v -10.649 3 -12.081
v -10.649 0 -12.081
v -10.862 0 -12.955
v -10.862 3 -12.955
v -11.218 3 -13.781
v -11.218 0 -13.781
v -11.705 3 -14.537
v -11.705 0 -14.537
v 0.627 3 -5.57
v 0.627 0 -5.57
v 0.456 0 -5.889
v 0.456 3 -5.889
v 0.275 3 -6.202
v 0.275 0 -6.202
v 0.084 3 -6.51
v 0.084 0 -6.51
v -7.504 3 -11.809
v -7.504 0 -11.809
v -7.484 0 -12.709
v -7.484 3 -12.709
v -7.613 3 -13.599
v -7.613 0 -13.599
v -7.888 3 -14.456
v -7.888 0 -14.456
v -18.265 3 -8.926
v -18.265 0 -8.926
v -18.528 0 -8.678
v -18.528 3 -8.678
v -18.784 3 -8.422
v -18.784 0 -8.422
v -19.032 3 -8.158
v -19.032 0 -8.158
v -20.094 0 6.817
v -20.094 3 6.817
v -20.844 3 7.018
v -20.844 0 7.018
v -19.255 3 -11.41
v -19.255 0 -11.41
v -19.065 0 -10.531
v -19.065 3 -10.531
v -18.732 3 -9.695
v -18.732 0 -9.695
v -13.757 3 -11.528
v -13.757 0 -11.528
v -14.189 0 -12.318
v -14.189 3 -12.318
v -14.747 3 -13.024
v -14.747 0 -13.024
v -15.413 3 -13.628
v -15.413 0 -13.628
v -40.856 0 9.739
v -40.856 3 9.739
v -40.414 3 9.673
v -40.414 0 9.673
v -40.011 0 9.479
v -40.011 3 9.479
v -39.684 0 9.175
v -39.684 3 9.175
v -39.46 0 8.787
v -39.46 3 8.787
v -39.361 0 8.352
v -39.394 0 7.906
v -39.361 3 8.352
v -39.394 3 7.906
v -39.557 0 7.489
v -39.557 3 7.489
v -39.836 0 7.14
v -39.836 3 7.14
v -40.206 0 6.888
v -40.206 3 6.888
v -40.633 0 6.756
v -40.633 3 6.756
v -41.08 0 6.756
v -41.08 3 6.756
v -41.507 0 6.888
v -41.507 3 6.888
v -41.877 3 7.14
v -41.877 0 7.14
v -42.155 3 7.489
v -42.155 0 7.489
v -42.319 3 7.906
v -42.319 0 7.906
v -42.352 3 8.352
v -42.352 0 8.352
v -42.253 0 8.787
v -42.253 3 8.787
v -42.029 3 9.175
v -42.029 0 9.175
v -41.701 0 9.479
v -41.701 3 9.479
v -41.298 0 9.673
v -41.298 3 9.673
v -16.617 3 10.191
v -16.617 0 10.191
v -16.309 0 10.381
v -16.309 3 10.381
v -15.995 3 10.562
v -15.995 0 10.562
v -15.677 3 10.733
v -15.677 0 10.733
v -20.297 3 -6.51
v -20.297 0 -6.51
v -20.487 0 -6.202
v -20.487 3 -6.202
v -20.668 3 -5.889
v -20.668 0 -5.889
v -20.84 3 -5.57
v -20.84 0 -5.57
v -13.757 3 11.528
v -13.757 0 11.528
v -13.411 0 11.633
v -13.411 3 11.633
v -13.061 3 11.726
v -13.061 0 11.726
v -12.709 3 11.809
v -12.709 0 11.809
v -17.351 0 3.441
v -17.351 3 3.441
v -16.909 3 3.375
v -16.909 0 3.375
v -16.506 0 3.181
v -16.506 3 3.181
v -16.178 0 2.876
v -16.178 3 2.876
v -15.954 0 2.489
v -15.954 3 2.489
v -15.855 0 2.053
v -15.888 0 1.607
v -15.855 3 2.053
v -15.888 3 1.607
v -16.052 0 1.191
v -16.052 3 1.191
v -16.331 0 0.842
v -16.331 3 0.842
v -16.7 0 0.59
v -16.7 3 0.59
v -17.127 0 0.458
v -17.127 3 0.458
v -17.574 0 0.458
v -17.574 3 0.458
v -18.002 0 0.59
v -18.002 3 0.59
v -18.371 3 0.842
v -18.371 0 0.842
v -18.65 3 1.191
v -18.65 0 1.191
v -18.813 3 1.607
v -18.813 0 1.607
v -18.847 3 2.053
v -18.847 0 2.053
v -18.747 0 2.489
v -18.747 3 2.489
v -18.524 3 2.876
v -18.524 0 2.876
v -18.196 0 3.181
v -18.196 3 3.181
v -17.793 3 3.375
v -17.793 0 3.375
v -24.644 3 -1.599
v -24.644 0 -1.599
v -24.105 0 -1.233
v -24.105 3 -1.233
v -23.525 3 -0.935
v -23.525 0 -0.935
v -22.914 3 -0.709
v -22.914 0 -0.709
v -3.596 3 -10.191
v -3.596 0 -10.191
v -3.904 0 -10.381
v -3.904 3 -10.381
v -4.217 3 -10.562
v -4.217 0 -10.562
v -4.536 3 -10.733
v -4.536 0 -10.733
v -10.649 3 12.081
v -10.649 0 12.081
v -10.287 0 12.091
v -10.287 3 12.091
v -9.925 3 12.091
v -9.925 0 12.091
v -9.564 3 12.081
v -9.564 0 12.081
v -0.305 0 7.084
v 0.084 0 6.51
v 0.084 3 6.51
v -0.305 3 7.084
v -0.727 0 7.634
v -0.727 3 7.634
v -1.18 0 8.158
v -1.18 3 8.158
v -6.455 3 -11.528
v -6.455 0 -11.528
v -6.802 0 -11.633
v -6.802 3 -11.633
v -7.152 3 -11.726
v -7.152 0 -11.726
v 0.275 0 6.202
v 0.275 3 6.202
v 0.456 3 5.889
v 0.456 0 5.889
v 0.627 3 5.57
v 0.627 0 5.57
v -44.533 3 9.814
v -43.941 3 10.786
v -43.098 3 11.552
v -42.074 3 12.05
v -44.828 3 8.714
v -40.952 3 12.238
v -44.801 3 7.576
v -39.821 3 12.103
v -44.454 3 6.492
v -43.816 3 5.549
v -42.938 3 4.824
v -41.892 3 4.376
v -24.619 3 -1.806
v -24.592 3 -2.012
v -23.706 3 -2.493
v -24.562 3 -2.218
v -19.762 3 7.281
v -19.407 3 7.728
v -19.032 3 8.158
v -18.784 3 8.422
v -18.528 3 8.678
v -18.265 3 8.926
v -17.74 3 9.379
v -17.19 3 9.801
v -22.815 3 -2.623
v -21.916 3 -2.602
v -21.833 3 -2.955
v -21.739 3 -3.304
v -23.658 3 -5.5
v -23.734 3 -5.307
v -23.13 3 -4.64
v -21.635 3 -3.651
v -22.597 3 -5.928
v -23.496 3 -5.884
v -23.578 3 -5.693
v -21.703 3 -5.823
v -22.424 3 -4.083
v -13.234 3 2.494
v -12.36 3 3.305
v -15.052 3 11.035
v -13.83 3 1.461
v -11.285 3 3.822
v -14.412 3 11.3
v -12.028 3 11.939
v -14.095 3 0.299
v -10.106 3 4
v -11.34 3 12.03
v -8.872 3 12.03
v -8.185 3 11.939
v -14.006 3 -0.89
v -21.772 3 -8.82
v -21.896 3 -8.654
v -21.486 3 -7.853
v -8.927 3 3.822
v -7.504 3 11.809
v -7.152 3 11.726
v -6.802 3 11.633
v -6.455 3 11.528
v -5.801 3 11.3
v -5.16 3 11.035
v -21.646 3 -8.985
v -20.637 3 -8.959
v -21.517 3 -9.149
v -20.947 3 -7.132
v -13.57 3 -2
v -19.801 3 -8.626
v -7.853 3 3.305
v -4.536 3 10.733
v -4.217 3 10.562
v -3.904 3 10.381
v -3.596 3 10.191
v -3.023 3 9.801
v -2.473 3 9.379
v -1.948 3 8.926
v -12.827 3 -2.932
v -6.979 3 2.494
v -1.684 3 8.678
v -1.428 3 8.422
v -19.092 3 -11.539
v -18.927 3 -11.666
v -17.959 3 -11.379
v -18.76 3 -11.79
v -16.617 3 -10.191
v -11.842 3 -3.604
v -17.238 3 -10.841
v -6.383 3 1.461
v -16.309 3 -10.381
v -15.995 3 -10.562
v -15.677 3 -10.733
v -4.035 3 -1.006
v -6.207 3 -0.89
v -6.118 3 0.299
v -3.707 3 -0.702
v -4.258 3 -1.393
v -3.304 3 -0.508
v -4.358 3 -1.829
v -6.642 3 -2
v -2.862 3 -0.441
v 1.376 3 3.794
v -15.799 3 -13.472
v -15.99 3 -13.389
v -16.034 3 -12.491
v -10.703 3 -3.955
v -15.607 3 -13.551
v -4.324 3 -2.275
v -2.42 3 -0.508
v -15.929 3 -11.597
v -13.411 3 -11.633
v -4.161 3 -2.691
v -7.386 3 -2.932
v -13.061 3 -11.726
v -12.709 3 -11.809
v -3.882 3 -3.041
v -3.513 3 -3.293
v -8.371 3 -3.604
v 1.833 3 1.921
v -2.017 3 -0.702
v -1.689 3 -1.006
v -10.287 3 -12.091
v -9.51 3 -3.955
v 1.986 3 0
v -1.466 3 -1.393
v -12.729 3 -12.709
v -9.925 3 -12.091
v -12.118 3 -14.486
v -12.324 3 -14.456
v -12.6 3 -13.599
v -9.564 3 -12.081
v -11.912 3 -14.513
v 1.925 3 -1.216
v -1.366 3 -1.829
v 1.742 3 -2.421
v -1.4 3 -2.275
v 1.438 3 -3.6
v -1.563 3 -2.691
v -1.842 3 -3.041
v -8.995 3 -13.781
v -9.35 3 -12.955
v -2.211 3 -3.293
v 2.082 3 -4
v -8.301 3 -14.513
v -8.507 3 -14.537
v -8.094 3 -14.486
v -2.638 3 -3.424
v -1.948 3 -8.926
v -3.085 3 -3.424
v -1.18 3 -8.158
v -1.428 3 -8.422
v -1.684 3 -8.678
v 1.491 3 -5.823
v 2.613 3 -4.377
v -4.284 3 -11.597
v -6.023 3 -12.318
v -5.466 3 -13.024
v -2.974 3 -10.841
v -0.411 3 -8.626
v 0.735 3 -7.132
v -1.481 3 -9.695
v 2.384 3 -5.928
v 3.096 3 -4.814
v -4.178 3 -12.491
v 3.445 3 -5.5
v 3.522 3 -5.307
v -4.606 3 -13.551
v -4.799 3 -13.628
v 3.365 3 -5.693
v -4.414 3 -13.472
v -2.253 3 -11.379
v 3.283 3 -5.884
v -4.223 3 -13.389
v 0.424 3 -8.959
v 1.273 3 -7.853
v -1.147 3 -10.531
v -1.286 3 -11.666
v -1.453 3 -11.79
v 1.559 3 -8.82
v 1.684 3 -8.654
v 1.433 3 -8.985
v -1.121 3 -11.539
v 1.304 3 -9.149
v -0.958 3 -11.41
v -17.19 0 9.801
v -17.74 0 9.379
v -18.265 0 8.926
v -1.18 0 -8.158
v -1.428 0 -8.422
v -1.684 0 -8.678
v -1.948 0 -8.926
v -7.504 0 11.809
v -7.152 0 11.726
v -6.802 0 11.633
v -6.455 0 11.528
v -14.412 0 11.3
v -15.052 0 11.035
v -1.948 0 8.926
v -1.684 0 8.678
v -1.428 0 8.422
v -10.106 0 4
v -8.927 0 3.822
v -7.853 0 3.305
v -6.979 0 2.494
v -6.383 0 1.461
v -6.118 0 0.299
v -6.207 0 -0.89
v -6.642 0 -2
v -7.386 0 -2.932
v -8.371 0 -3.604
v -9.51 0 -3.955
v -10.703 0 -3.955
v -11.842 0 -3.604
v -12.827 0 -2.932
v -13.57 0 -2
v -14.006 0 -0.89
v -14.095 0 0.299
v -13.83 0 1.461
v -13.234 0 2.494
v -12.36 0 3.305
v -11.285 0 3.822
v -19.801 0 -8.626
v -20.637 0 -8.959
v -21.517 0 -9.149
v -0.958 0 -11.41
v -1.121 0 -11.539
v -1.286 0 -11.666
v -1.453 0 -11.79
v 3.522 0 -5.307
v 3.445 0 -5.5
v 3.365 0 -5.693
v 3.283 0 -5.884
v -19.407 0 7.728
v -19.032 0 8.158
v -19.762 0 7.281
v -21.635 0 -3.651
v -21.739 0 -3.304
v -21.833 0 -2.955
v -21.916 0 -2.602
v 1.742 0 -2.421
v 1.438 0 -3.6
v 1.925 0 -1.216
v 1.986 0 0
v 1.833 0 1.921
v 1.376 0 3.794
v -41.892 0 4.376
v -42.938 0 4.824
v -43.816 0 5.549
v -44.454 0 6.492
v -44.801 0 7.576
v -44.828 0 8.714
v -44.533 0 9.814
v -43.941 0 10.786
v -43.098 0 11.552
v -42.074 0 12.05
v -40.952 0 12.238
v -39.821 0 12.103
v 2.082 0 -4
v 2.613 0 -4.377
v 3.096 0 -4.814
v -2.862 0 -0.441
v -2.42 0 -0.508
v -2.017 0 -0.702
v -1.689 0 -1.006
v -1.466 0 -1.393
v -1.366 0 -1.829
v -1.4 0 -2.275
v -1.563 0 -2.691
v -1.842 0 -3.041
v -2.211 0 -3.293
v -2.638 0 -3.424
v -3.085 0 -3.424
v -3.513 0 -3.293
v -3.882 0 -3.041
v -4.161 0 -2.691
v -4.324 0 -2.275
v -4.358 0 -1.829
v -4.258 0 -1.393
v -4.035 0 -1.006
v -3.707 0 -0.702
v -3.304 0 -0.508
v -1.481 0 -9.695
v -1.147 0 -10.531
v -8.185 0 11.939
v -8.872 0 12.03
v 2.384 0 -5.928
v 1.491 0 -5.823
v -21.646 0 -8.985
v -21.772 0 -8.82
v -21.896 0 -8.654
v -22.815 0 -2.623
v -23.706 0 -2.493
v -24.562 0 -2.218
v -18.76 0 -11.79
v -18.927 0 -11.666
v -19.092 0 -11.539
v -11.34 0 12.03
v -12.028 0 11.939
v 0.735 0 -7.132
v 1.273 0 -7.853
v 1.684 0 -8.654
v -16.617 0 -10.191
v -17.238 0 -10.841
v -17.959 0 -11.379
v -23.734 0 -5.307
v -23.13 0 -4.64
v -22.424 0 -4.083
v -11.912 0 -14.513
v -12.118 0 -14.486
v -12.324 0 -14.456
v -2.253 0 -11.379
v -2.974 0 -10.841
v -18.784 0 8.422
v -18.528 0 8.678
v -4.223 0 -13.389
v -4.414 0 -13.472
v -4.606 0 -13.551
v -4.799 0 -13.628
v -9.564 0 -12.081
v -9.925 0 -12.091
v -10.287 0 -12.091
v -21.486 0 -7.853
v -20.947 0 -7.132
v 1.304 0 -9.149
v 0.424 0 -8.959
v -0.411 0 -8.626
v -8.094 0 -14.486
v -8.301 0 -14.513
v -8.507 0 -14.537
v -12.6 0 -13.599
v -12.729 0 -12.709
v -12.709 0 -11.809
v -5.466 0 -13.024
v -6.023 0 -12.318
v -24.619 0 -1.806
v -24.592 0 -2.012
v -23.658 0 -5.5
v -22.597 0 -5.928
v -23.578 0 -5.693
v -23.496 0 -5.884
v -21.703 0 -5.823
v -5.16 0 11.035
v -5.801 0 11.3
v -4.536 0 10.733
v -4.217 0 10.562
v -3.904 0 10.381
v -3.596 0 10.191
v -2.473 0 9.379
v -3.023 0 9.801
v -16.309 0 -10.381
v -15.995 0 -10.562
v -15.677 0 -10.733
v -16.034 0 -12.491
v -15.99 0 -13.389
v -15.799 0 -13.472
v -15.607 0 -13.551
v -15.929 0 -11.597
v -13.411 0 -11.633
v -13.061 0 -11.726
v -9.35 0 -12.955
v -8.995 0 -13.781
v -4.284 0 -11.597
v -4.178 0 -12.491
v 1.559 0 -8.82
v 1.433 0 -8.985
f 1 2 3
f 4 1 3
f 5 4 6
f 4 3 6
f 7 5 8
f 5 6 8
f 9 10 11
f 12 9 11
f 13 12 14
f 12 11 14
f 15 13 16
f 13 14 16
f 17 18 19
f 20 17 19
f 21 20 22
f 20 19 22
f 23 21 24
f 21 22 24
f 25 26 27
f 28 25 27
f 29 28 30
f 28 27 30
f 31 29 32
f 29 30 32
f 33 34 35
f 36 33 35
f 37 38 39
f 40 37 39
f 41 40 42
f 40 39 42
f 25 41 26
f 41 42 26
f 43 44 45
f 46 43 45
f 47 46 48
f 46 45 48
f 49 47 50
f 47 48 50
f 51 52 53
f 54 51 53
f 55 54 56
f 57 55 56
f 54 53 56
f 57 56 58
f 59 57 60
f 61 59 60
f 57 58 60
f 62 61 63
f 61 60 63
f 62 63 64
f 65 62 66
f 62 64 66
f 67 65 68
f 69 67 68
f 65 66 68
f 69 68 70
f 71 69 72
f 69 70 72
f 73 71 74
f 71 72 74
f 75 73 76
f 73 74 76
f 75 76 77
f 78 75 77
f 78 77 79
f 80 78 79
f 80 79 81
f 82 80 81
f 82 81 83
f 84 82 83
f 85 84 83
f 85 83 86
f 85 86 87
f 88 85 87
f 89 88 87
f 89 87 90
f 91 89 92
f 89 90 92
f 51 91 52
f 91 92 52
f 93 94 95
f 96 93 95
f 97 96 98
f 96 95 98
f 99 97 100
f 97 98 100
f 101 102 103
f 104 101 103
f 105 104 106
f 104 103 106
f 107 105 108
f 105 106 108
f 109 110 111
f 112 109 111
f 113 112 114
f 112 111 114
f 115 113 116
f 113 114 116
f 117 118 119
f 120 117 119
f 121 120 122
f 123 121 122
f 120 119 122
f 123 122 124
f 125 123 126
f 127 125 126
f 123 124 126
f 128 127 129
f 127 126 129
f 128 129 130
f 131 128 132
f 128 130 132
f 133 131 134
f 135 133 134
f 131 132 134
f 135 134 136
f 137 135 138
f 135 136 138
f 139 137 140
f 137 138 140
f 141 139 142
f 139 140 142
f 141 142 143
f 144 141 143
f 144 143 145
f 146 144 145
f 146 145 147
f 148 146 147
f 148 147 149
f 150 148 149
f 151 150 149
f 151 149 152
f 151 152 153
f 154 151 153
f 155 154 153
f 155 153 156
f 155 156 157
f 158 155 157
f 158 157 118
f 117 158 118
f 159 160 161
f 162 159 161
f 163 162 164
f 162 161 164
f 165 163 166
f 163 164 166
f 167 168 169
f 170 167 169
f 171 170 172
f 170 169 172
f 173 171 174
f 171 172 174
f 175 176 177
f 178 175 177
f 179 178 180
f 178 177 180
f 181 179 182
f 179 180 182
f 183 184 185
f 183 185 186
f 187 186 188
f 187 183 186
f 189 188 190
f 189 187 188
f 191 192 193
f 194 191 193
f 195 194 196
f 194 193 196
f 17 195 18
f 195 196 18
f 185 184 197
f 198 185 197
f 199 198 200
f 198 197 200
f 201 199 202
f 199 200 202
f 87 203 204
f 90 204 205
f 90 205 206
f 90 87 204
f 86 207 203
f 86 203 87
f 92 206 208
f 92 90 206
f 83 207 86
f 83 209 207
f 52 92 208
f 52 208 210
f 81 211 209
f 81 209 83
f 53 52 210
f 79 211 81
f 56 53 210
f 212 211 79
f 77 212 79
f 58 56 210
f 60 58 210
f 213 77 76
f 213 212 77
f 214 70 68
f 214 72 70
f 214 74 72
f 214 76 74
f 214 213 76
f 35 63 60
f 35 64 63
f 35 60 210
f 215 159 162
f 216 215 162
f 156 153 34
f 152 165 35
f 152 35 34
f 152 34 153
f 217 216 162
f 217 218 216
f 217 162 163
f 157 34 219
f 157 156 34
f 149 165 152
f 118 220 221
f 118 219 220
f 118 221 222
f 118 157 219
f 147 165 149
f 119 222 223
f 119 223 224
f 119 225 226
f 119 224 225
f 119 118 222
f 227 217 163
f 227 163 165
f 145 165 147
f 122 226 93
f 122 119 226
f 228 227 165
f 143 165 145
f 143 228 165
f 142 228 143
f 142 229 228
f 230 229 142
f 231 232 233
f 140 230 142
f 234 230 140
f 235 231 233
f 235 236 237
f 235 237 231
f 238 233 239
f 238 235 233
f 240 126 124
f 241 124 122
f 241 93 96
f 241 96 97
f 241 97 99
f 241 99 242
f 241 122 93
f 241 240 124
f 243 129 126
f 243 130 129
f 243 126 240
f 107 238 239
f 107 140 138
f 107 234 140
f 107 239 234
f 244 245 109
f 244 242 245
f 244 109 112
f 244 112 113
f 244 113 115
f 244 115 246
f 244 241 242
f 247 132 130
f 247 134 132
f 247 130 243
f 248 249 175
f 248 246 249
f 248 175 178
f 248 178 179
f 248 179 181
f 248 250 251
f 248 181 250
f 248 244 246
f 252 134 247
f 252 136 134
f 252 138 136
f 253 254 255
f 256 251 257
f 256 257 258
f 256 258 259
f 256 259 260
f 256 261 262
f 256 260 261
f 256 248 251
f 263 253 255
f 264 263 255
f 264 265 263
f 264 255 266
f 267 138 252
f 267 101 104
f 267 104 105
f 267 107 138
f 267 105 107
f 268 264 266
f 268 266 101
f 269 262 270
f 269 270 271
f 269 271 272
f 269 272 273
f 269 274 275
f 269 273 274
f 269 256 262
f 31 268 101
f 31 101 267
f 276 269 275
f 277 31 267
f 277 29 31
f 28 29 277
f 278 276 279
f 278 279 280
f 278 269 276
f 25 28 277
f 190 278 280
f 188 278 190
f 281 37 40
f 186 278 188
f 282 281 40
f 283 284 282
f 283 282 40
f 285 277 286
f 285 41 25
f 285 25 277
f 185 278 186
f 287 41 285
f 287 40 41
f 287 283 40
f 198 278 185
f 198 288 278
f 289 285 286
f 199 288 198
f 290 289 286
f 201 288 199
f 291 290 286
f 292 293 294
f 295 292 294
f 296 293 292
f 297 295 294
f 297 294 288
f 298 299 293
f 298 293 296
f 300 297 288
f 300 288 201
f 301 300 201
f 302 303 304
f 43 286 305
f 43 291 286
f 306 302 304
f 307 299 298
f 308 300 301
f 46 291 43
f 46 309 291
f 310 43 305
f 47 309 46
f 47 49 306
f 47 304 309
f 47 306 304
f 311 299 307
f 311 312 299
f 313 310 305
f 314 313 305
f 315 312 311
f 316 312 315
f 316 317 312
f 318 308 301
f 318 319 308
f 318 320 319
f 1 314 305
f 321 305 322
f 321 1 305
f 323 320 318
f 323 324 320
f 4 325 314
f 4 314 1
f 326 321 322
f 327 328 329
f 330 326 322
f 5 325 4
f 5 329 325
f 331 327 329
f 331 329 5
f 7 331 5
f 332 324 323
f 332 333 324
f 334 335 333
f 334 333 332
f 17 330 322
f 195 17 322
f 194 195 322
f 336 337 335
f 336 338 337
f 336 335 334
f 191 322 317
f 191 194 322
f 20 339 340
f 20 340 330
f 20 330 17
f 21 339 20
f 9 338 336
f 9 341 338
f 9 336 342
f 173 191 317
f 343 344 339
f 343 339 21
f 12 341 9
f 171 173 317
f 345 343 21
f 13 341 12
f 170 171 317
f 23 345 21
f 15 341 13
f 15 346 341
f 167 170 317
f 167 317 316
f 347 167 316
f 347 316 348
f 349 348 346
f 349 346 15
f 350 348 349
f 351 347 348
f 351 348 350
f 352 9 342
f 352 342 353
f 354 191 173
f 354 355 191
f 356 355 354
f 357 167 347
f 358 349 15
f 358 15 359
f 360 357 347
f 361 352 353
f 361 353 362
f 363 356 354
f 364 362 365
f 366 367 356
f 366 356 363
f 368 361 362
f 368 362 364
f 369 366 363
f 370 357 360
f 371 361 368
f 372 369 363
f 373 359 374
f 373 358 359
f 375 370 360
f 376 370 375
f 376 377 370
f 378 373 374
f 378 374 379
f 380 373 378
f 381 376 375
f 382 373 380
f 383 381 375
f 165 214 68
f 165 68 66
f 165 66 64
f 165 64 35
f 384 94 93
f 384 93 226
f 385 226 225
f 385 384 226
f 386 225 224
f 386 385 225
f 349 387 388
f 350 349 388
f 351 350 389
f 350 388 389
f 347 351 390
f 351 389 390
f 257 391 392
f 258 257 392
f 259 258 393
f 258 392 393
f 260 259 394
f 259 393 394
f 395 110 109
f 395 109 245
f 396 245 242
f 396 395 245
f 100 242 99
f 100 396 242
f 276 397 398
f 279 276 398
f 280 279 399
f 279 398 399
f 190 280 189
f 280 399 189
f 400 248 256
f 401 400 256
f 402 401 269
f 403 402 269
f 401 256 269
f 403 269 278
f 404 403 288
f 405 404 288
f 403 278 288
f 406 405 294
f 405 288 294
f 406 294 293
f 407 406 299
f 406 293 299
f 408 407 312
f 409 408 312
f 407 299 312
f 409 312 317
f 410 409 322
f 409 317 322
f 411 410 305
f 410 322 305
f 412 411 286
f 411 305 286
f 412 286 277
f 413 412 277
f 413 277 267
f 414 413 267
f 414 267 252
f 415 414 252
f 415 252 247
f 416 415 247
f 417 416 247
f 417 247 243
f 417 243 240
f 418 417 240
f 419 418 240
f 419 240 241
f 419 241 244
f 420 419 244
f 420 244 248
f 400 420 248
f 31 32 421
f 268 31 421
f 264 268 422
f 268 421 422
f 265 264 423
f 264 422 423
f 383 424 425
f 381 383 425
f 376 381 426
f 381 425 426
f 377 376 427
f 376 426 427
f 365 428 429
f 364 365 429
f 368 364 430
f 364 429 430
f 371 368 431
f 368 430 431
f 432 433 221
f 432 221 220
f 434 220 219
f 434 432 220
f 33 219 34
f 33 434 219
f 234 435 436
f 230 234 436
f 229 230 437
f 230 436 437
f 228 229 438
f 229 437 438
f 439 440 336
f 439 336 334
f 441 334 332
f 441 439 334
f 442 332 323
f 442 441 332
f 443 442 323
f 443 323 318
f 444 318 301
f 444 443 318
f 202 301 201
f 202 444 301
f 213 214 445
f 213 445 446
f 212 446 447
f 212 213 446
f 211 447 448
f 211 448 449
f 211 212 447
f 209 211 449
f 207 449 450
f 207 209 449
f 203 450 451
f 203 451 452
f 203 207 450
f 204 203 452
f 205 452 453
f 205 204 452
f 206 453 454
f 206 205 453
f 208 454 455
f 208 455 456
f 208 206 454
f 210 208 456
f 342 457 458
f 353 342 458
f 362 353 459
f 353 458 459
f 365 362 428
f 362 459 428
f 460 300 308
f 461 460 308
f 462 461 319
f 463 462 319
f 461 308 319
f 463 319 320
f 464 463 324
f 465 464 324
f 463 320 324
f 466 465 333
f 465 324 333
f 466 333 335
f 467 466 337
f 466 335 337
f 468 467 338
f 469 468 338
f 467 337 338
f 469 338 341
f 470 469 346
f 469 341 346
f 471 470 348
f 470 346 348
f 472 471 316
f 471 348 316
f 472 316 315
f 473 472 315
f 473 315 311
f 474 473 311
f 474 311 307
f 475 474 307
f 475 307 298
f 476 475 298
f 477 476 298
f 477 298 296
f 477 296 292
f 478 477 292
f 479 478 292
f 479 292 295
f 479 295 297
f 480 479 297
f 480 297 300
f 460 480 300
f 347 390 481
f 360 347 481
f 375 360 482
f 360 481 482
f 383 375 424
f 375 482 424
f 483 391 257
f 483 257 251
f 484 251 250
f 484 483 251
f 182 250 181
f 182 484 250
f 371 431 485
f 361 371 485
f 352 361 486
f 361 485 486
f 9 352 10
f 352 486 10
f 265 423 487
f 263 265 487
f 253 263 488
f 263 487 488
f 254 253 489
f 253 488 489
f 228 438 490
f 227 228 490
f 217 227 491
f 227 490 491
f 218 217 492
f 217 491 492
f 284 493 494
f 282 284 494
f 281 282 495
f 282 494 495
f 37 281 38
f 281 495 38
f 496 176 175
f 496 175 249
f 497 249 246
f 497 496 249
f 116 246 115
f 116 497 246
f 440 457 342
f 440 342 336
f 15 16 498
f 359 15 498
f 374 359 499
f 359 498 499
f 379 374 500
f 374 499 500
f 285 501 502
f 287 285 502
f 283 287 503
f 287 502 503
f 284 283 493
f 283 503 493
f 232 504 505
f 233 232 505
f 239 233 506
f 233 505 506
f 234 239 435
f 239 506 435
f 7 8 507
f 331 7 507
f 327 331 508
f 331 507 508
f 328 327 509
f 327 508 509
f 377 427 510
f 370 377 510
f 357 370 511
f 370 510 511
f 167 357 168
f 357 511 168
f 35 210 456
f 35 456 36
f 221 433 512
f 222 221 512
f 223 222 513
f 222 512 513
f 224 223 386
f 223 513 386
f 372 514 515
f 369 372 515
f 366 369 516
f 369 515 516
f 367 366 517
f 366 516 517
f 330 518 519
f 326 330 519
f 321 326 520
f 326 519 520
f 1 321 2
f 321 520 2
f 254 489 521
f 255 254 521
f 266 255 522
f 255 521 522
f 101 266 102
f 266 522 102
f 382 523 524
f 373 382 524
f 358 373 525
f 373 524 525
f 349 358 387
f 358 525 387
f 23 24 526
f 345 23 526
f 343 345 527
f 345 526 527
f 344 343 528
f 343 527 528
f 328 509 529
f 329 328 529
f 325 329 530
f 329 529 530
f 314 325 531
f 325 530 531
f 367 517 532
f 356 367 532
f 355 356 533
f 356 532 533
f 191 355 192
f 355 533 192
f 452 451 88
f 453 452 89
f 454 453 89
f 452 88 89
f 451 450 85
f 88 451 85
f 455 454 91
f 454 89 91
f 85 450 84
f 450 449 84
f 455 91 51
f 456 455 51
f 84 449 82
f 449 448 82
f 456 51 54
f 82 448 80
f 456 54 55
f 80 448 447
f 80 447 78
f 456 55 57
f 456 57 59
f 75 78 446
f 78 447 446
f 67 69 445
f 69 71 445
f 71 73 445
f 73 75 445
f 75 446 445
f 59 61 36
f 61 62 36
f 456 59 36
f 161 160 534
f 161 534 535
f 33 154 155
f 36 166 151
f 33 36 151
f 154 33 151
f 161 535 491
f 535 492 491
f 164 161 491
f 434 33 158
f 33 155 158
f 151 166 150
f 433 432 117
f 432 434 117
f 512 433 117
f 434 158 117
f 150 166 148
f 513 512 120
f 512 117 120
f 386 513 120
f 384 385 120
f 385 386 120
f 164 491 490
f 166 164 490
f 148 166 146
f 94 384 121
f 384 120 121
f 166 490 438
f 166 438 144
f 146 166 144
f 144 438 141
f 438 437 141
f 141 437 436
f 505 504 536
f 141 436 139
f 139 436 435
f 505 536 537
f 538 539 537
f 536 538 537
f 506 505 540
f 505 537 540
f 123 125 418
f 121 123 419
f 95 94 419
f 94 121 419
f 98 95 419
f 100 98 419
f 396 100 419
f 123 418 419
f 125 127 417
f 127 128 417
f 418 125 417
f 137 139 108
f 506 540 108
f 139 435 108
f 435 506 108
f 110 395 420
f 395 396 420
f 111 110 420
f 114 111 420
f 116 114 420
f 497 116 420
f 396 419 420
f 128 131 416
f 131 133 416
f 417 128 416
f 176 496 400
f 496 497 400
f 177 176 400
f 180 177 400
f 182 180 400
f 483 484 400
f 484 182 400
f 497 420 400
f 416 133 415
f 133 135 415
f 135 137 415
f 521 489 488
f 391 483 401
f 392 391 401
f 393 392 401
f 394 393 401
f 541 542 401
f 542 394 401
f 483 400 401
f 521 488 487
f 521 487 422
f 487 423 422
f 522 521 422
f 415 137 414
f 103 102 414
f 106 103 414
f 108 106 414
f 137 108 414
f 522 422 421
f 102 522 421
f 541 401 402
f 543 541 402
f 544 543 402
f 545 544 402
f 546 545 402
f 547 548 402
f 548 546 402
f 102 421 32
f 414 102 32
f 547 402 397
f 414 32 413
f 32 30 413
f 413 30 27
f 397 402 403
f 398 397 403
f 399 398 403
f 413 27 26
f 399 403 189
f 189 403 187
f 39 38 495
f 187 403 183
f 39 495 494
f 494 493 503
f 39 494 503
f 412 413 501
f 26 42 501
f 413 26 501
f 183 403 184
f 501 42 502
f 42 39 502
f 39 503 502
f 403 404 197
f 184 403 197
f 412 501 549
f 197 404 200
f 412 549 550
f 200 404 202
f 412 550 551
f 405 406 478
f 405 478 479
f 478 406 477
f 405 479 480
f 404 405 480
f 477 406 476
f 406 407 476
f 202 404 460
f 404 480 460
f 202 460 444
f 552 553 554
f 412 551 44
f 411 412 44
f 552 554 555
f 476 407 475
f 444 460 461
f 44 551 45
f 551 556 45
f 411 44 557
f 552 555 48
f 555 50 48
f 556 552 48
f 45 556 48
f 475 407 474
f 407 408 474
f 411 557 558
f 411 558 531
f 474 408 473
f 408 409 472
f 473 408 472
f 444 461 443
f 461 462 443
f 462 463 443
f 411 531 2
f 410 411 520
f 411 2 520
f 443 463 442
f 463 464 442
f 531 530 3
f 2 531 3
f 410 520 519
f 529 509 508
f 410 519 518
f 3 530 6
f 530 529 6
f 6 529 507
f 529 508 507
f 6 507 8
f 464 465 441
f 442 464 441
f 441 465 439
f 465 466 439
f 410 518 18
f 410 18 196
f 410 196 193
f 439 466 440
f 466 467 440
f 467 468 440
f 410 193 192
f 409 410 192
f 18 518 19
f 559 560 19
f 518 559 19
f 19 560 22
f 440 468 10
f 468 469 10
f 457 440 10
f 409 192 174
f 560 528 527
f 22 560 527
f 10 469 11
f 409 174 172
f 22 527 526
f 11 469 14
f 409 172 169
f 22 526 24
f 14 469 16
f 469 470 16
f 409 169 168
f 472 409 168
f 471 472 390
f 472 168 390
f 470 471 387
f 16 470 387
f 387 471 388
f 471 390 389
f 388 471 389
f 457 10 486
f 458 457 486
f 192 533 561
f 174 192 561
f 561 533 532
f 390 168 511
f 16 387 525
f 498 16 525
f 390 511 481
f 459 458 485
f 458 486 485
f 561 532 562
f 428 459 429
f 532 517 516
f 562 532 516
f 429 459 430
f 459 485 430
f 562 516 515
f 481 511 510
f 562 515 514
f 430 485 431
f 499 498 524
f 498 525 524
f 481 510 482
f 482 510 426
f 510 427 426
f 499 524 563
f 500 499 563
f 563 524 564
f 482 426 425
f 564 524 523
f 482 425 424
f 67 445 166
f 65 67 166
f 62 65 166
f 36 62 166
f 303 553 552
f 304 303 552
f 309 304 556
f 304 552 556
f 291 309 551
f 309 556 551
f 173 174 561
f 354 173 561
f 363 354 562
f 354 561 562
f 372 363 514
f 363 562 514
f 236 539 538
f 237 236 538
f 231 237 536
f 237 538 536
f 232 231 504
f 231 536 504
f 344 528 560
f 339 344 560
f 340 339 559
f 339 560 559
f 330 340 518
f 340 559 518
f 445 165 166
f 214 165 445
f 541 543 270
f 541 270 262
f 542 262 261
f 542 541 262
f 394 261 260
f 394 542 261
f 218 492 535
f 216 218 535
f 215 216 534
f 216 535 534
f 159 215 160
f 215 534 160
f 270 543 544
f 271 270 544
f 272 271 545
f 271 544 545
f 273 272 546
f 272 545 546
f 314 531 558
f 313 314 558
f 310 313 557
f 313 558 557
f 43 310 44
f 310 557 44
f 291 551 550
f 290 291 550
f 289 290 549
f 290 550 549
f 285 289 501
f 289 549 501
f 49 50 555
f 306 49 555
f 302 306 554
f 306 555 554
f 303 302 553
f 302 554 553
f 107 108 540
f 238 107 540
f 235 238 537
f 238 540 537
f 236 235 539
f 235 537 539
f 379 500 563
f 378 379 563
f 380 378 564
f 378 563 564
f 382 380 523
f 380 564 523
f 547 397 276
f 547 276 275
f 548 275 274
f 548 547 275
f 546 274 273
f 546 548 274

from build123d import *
from build123d.topology import SkipClean

# Parameters (mm, degrees)
SKETCH1_R           = 1.5
BOSS_EXTRUDE1_DEPTH = 3
SKETCH3_R           = 1.5
BOSS_EXTRUDE2_DEPTH = 3
CUT_EXTRUDE1_START  = -3
CUT_EXTRUDE1_DEPTH  = 3
CUT_EXTRUDE2_REACH  = 49.249
SKETCH5_R           = 1.5
SKETCH5_R_2         = 4


with BuildPart() as part:
    # Sketch1 → Boss-Extrude1 (new body)
    with BuildSketch(Plane(origin=(0, 0, 0), x_dir=(1, 0, 0), z_dir=(0, 1, 0))):
        with BuildLine():
            Line((20.643657446, 4), (2.081641936, 4))
            ThreePointArc((2.081641936, 4), (2.861028333, 4.588201733), (3.521749436, 5.30713988))
            ThreePointArc((3.521749436, 5.30713988), (3.405395609, 5.596745198), (3.282888305, 5.883801663))
            ThreePointArc((3.282888305, 5.883801663), (1.93527598, 5.894040025), (0.627094961, 5.57027124))
            ThreePointArc((0.627094961, 5.57027124), (0.366286148, 6.046375), (0.084372603, 6.510293938))
            ThreePointArc((0.084372603, 6.510293938), (1.018855105, 7.48132754), (1.683794586, 8.65351323))
            ThreePointArc((1.683794586, 8.65351323), (1.496450048, 8.903135899), (1.303821399, 9.148703928))
            ThreePointArc((1.303821399, 9.148703928), (-0.000522033, 8.809805691), (-1.180330337, 8.158486898))
            ThreePointArc((-1.180330337, 8.158486898), (-1.555477026, 8.550865528), (-1.947855656, 8.926012217))
            ThreePointArc((-1.947855656, 8.926012217), (-1.296536862, 10.105820521), (-0.957638625, 11.410163953))
            ThreePointArc((-0.957638625, 11.410163953), (-1.203206655, 11.602792602), (-1.452829324, 11.79013714))
            ThreePointArc((-1.452829324, 11.79013714), (-2.625015014, 11.125197659), (-3.596048616, 10.190715157))
            ThreePointArc((-3.596048616, 10.190715157), (-4.059967554, 10.472628702), (-4.536071314, 10.733437515))
            ThreePointArc((-4.536071314, 10.733437515), (-4.212302529, 12.041618533), (-4.222540891, 13.389230859))
            ThreePointArc((-4.222540891, 13.389230859), (-4.509597355, 13.511738163), (-4.799202674, 13.62809199))
            ThreePointArc((-4.799202674, 13.62809199), (-5.759348103, 12.682425791), (-6.455432668, 11.528463019))
            ThreePointArc((-6.455432668, 11.528463019), (-6.976508546, 11.680699536), (-7.503891752, 11.809396783))
            ThreePointArc((-7.503891752, 11.809396783), (-7.529737283, 13.156800143), (-7.888414517, 14.455843809))
            ThreePointArc((-7.888414517, 14.455843809), (-8.197396993, 14.499881098), (-8.507248835, 14.537314892))
            ThreePointArc((-8.507248835, 14.537314892), (-9.18992168, 13.375367565), (-9.563620196, 12.080565177))
            ThreePointArc((-9.563620196, 12.080565177), (-10.106342554, 12.09275), (-10.649064912, 12.080565177))
            ThreePointArc((-10.649064912, 12.080565177), (-11.022763428, 13.375367565), (-11.705436272, 14.537314892))
            ThreePointArc((-11.705436272, 14.537314892), (-12.015288115, 14.499881098), (-12.324270591, 14.455843809))
            ThreePointArc((-12.324270591, 14.455843809), (-12.682947825, 13.156800143), (-12.708793355, 11.809396783))
            ThreePointArc((-12.708793355, 11.809396783), (-13.236176561, 11.680699536), (-13.757252439, 11.528463019))
            ThreePointArc((-13.757252439, 11.528463019), (-14.453337005, 12.682425791), (-15.413482434, 13.62809199))
            ThreePointArc((-15.413482434, 13.62809199), (-15.703087752, 13.511738163), (-15.990144217, 13.389230859))
            ThreePointArc((-15.990144217, 13.389230859), (-16.000382579, 12.041618533), (-15.676613793, 10.733437515))
            ThreePointArc((-15.676613793, 10.733437515), (-16.152717554, 10.472628702), (-16.616636492, 10.190715157))
            ThreePointArc((-16.616636492, 10.190715157), (-17.587670094, 11.125197659), (-18.759855783, 11.79013714))
            ThreePointArc((-18.759855783, 11.79013714), (-19.009478453, 11.602792602), (-19.255046482, 11.410163953))
            ThreePointArc((-19.255046482, 11.410163953), (-18.916148245, 10.105820521), (-18.264829452, 8.926012217))
            ThreePointArc((-18.264829452, 8.926012217), (-18.657208082, 8.550865528), (-19.032354771, 8.158486898))
            ThreePointArc((-19.032354771, 8.158486898), (-20.212163074, 8.809805691), (-21.516506507, 9.148703928))
            ThreePointArc((-21.516506507, 9.148703928), (-21.709135156, 8.903135899), (-21.896479694, 8.65351323))
            ThreePointArc((-21.896479694, 8.65351323), (-21.231540213, 7.48132754), (-20.297057711, 6.510293938))
            ThreePointArc((-20.297057711, 6.510293938), (-20.578971255, 6.046375), (-20.839780068, 5.57027124))
            ThreePointArc((-20.839780068, 5.57027124), (-22.147961087, 5.894040025), (-23.495573413, 5.883801663))
            ThreePointArc((-23.495573413, 5.883801663), (-23.618080717, 5.596745198), (-23.734434544, 5.30713988))
            ThreePointArc((-23.734434544, 5.30713988), (-22.788768345, 4.346994451), (-21.634805572, 3.650909885))
            ThreePointArc((-21.634805572, 3.650909885), (-21.78704209, 3.129834008), (-21.915739337, 2.602450802))
            ThreePointArc((-21.915739337, 2.602450802), (-23.263142697, 2.576605271), (-24.562186363, 2.217928037))
            ThreePointArc((-24.562186363, 2.217928037), (-24.606223651, 1.908945561), (-24.643657446, 1.599093719))
            ThreePointArc((-24.643657446, 1.599093719), (-23.481710119, 0.916420874), (-22.186907731, 0.542722358))
            ThreePointArc((-22.186907731, 0.542722358), (-22.199092554, 0), (-22.186907731, -0.542722358))
            ThreePointArc((-22.186907731, -0.542722358), (-23.481710119, -0.916420874), (-24.643657446, -1.599093719))
            ThreePointArc((-24.643657446, -1.599093719), (-24.606223651, -1.908945561), (-24.562186363, -2.217928037))
            ThreePointArc((-24.562186363, -2.217928037), (-23.263142697, -2.576605271), (-21.915739337, -2.602450802))
            ThreePointArc((-21.915739337, -2.602450802), (-21.78704209, -3.129834008), (-21.634805572, -3.650909885))
            ThreePointArc((-21.634805572, -3.650909885), (-22.788768345, -4.346994451), (-23.734434544, -5.30713988))
            ThreePointArc((-23.734434544, -5.30713988), (-23.618080717, -5.596745198), (-23.495573413, -5.883801663))
            ThreePointArc((-23.495573413, -5.883801663), (-22.147961087, -5.894040025), (-20.839780068, -5.57027124))
            ThreePointArc((-20.839780068, -5.57027124), (-20.578971255, -6.046375), (-20.297057711, -6.510293938))
            ThreePointArc((-20.297057711, -6.510293938), (-21.231540213, -7.48132754), (-21.896479694, -8.65351323))
            ThreePointArc((-21.896479694, -8.65351323), (-21.709135156, -8.903135899), (-21.516506507, -9.148703928))
            ThreePointArc((-21.516506507, -9.148703928), (-20.212163074, -8.809805691), (-19.032354771, -8.158486898))
            ThreePointArc((-19.032354771, -8.158486898), (-18.657208082, -8.550865528), (-18.264829452, -8.926012217))
            ThreePointArc((-18.264829452, -8.926012217), (-18.916148245, -10.105820521), (-19.255046482, -11.410163953))
            ThreePointArc((-19.255046482, -11.410163953), (-19.009478453, -11.602792602), (-18.759855783, -11.79013714))
            ThreePointArc((-18.759855783, -11.79013714), (-17.587670094, -11.125197659), (-16.616636492, -10.190715157))
            ThreePointArc((-16.616636492, -10.190715157), (-16.152717554, -10.472628702), (-15.676613793, -10.733437515))
            ThreePointArc((-15.676613793, -10.733437515), (-16.000382579, -12.041618533), (-15.990144217, -13.389230859))
            ThreePointArc((-15.990144217, -13.389230859), (-15.703087752, -13.511738163), (-15.413482434, -13.62809199))
            ThreePointArc((-15.413482434, -13.62809199), (-14.453337005, -12.682425791), (-13.757252439, -11.528463019))
            ThreePointArc((-13.757252439, -11.528463019), (-13.236176561, -11.680699536), (-12.708793355, -11.809396783))
            ThreePointArc((-12.708793355, -11.809396783), (-12.682947825, -13.156800143), (-12.324270591, -14.455843809))
            ThreePointArc((-12.324270591, -14.455843809), (-12.015288115, -14.499881098), (-11.705436272, -14.537314892))
            ThreePointArc((-11.705436272, -14.537314892), (-11.022763428, -13.375367565), (-10.649064912, -12.080565177))
            ThreePointArc((-10.649064912, -12.080565177), (-10.106342554, -12.09275), (-9.563620196, -12.080565177))
            ThreePointArc((-9.563620196, -12.080565177), (-9.18992168, -13.375367565), (-8.507248835, -14.537314892))
            ThreePointArc((-8.507248835, -14.537314892), (-8.197396993, -14.499881098), (-7.888414517, -14.455843809))
            ThreePointArc((-7.888414517, -14.455843809), (-7.529737283, -13.156800143), (-7.503891752, -11.809396783))
            ThreePointArc((-7.503891752, -11.809396783), (-6.976508546, -11.680699536), (-6.455432668, -11.528463019))
            ThreePointArc((-6.455432668, -11.528463019), (-5.759348103, -12.682425791), (-4.799202674, -13.62809199))
            ThreePointArc((-4.799202674, -13.62809199), (-4.509597355, -13.511738163), (-4.222540891, -13.389230859))
            ThreePointArc((-4.222540891, -13.389230859), (-4.212302529, -12.041618533), (-4.536071314, -10.733437515))
            ThreePointArc((-4.536071314, -10.733437515), (-4.059967554, -10.472628702), (-3.596048616, -10.190715157))
            ThreePointArc((-3.596048616, -10.190715157), (-2.625015014, -11.125197659), (-1.452829324, -11.79013714))
            ThreePointArc((-1.452829324, -11.79013714), (-1.203206655, -11.602792602), (-0.957638625, -11.410163953))
            ThreePointArc((-0.957638625, -11.410163953), (-1.296536862, -10.105820521), (-1.947855656, -8.926012217))
            ThreePointArc((-1.947855656, -8.926012217), (-1.555477026, -8.550865528), (-1.180330337, -8.158486898))
            ThreePointArc((-1.180330337, -8.158486898), (-0.000522033, -8.809805691), (1.303821399, -9.148703928))
            ThreePointArc((1.303821399, -9.148703928), (1.496450048, -8.903135899), (1.683794586, -8.65351323))
            ThreePointArc((1.683794586, -8.65351323), (1.018855105, -7.48132754), (0.084372603, -6.510293938))
            ThreePointArc((0.084372603, -6.510293938), (0.366286148, -6.046375), (0.627094961, -5.57027124))
            ThreePointArc((0.627094961, -5.57027124), (1.93527598, -5.894040025), (3.282888305, -5.883801663))
            ThreePointArc((3.282888305, -5.883801663), (3.405395609, -5.596745198), (3.521749436, -5.30713988))
            ThreePointArc((3.521749436, -5.30713988), (2.861028333, -4.588201733), (2.081641936, -4))
            Line((2.081641936, -4), (20.643657446, -4))
            ThreePointArc((20.643657446, -4), (24.643657446, 0), (20.643657446, 4))
        make_face()
        with Locations(Location((-10.106342554, 0, 0), (0, 0, 270))):
            Circle(SKETCH1_R, mode=Mode.SUBTRACT)
        with Locations(Location((20.643657446, 0, 0), (0, 0, 270))):
            Circle(SKETCH1_R, mode=Mode.SUBTRACT)
    extrude(amount=BOSS_EXTRUDE1_DEPTH)

    # Sketch3 → Boss-Extrude2 (add)
    with BuildSketch(Plane(origin=(0, 3, 0), x_dir=(1, 0, 0), z_dir=(0, 1, 0))):
        with BuildLine():
            ThreePointArc((-9.071066373, -3.863703305), (-13.970045859, -1.03527618), (-11.141618734, 3.863703305))
            Line((-11.141618734, 3.863703305), (-41.891618734, -4.375734362))
            ThreePointArc((-41.891618734, -4.375734362), (-44.720045859, -9.274713848), (-39.821066373, -12.103140972))
            Line((-39.821066373, -12.103140972), (-9.071066373, -3.863703305))
        make_face()
        with Locations(Location((-40.856342554, -8.239437667, 0), (0, 0, 270))):
            Circle(SKETCH3_R, mode=Mode.SUBTRACT)
    extrude(amount=-BOSS_EXTRUDE2_DEPTH)

    # Sketch4 → Cut-Extrude1 (cut)
    with SkipClean():  # the faces are left unmerged after this step: merging them gives an invalid solid
        with BuildSketch(Plane(origin=(0, 3, 0), x_dir=(1, 0, 0), z_dir=(0, 1, 0)).offset(CUT_EXTRUDE1_START)):
            with BuildLine():
                ThreePointArc((-21.516506507, -9.148703928), (-20.212163074, -8.809805691), (-19.032354771, -8.158486898))
                ThreePointArc((-19.032354771, -8.158486898), (-19.58704562, -7.506721784), (-20.094248238, -6.817355984))
                Line((-20.094248238, -6.817355984), (-20.843755363, -7.018185813))
                ThreePointArc((-20.843755363, -7.018185813), (-21.444347002, -7.788065101), (-21.896479694, -8.65351323))
                ThreePointArc((-21.896479694, -8.65351323), (-21.709135156, -8.903135899), (-21.516506507, -9.148703928))
            make_face()
            with BuildLine():
                ThreePointArc((-18.759855783, -11.79013714), (-17.587670094, -11.125197659), (-16.616636492, -10.190715157))
                ThreePointArc((-16.616636492, -10.190715157), (-17.467942324, -9.593823606), (-18.264829452, -8.926012217))
                ThreePointArc((-18.264829452, -8.926012217), (-18.916148245, -10.105820521), (-19.255046482, -11.410163953))
                ThreePointArc((-19.255046482, -11.410163953), (-19.009478453, -11.602792602), (-18.759855783, -11.79013714))
            make_face()
            with BuildLine():
                ThreePointArc((-15.413482434, -13.62809199), (-14.453337005, -12.682425791), (-13.757252439, -11.528463019))
                ThreePointArc((-13.757252439, -11.528463019), (-14.734037631, -11.172244217), (-15.676613793, -10.733437515))
                ThreePointArc((-15.676613793, -10.733437515), (-16.000382579, -12.041618533), (-15.990144217, -13.389230859))
                ThreePointArc((-15.990144217, -13.389230859), (-15.703087752, -13.511738163), (-15.413482434, -13.62809199))
            make_face()
            with BuildLine():
                ThreePointArc((-11.705436272, -14.537314892), (-11.022763428, -13.375367565), (-10.649064912, -12.080565177))
                ThreePointArc((-10.649064912, -12.080565177), (-11.684763165, -11.989294847), (-12.708793355, -11.809396783))
                ThreePointArc((-12.708793355, -11.809396783), (-12.682947825, -13.156800143), (-12.324270591, -14.455843809))
                ThreePointArc((-12.324270591, -14.455843809), (-12.015288115, -14.499881098), (-11.705436272, -14.537314892))
            make_face()
            with BuildLine():
                ThreePointArc((-7.888414517, -14.455843809), (-7.529737283, -13.156800143), (-7.503891752, -11.809396783))
                ThreePointArc((-7.503891752, -11.809396783), (-8.527921943, -11.989294847), (-9.563620196, -12.080565177))
                ThreePointArc((-9.563620196, -12.080565177), (-9.18992168, -13.375367565), (-8.507248835, -14.537314892))
                ThreePointArc((-8.507248835, -14.537314892), (-8.197396993, -14.499881098), (-7.888414517, -14.455843809))
            make_face()
            with BuildLine():
                ThreePointArc((-4.222540891, -13.389230859), (-4.212302529, -12.041618533), (-4.536071314, -10.733437515))
                ThreePointArc((-4.536071314, -10.733437515), (-5.478647477, -11.172244217), (-6.455432668, -11.528463019))
                ThreePointArc((-6.455432668, -11.528463019), (-5.759348103, -12.682425791), (-4.799202674, -13.62809199))
                ThreePointArc((-4.799202674, -13.62809199), (-4.509597355, -13.511738163), (-4.222540891, -13.389230859))
            make_face()
            with BuildLine():
                ThreePointArc((-0.957638625, -11.410163953), (-1.296536862, -10.105820521), (-1.947855656, -8.926012217))
                ThreePointArc((-1.947855656, -8.926012217), (-2.744742783, -9.593823606), (-3.596048616, -10.190715157))
                ThreePointArc((-3.596048616, -10.190715157), (-2.625015014, -11.125197659), (-1.452829324, -11.79013714))
                ThreePointArc((-1.452829324, -11.79013714), (-1.203206655, -11.602792602), (-0.957638625, -11.410163953))
            make_face()
            with BuildLine():
                ThreePointArc((1.683794586, -8.65351323), (1.018855105, -7.48132754), (0.084372603, -6.510293938))
                ThreePointArc((0.084372603, -6.510293938), (-0.512518948, -7.361599771), (-1.180330337, -8.158486898))
                ThreePointArc((-1.180330337, -8.158486898), (-0.000522033, -8.809805691), (1.303821399, -9.148703928))
                ThreePointArc((1.303821399, -9.148703928), (1.496450048, -8.903135899), (1.683794586, -8.65351323))
            make_face()
            with BuildLine():
                ThreePointArc((20.643657446, -4), (24.643657446, 0), (20.643657446, 4))
                Line((20.643657446, 4), (2.081641936, 4))
                Line((2.081641936, 4), (1.43808022, 3.600125745))
                ThreePointArc((1.43808022, 3.600125745), (1.848539735, 1.820821801), (1.986407446, 0))
                ThreePointArc((1.986407446, 0), (1.641665343, -2.866864669), (0.627094961, -5.57027124))
                ThreePointArc((0.627094961, -5.57027124), (1.93527598, -5.894040025), (3.282888305, -5.883801663))
                ThreePointArc((3.282888305, -5.883801663), (3.405395609, -5.596745198), (3.521749436, -5.30713988))
                ThreePointArc((3.521749436, -5.30713988), (2.861028333, -4.588201733), (2.081641936, -4))
                Line((2.081641936, -4), (20.643657446, -4))
            make_face()
        extrude(amount=CUT_EXTRUDE1_DEPTH, mode=Mode.SUBTRACT)

    # Sketch5 → Cut-Extrude2 (cut, up to next)
    with BuildSketch(Plane(origin=(0, 3, 0), x_dir=(1, 0, 0), z_dir=(0, 1, 0)), mode=Mode.PRIVATE) as cut_extrude2_sk1:
        with Locations(Location((-2.861898857, 1.941142838, 0), (0, 0, 270))):
            Circle(SKETCH5_R)
    cut_extrude2_tool1 = extrude(cut_extrude2_sk1.sketch, amount=-CUT_EXTRUDE2_REACH, mode=Mode.PRIVATE) & part.part
    # Sketch5 → Cut-Extrude2 (cut, up to next)
    with BuildSketch(Plane(origin=(0, 3, 0), x_dir=(1, 0, 0), z_dir=(0, 1, 0)), mode=Mode.PRIVATE) as cut_extrude2_sk2:
        with Locations(Location((-17.350786251, -1.941142838, 0), (0, 0, 270))):
            Circle(SKETCH5_R)
    cut_extrude2_tool2 = extrude(cut_extrude2_sk2.sketch, amount=-CUT_EXTRUDE2_REACH, mode=Mode.PRIVATE) & part.part
    # Sketch5 → Cut-Extrude2 (cut, up to next)
    with BuildSketch(Plane(origin=(0, 3, 0), x_dir=(1, 0, 0), z_dir=(0, 1, 0)), mode=Mode.PRIVATE) as cut_extrude2_sk3:
        with Locations(Location((-10.106342554, 0, 0), (0, 0, 270))):
            Circle(SKETCH5_R_2)
    cut_extrude2_tool3 = extrude(cut_extrude2_sk3.sketch, amount=-CUT_EXTRUDE2_REACH, mode=Mode.PRIVATE) & part.part
    add(cut_extrude2_tool1.solids().sort_by_distance((-2.861899, 3, -1.941143))[0], mode=Mode.SUBTRACT)
    add(cut_extrude2_tool2.solids().sort_by_distance((-17.350786, 3, 1.941143))[0], mode=Mode.SUBTRACT)
    add(cut_extrude2_tool3.solids().sort_by_distance((-10.106343, 3, 0))[0], mode=Mode.SUBTRACT)


solid = part.part
